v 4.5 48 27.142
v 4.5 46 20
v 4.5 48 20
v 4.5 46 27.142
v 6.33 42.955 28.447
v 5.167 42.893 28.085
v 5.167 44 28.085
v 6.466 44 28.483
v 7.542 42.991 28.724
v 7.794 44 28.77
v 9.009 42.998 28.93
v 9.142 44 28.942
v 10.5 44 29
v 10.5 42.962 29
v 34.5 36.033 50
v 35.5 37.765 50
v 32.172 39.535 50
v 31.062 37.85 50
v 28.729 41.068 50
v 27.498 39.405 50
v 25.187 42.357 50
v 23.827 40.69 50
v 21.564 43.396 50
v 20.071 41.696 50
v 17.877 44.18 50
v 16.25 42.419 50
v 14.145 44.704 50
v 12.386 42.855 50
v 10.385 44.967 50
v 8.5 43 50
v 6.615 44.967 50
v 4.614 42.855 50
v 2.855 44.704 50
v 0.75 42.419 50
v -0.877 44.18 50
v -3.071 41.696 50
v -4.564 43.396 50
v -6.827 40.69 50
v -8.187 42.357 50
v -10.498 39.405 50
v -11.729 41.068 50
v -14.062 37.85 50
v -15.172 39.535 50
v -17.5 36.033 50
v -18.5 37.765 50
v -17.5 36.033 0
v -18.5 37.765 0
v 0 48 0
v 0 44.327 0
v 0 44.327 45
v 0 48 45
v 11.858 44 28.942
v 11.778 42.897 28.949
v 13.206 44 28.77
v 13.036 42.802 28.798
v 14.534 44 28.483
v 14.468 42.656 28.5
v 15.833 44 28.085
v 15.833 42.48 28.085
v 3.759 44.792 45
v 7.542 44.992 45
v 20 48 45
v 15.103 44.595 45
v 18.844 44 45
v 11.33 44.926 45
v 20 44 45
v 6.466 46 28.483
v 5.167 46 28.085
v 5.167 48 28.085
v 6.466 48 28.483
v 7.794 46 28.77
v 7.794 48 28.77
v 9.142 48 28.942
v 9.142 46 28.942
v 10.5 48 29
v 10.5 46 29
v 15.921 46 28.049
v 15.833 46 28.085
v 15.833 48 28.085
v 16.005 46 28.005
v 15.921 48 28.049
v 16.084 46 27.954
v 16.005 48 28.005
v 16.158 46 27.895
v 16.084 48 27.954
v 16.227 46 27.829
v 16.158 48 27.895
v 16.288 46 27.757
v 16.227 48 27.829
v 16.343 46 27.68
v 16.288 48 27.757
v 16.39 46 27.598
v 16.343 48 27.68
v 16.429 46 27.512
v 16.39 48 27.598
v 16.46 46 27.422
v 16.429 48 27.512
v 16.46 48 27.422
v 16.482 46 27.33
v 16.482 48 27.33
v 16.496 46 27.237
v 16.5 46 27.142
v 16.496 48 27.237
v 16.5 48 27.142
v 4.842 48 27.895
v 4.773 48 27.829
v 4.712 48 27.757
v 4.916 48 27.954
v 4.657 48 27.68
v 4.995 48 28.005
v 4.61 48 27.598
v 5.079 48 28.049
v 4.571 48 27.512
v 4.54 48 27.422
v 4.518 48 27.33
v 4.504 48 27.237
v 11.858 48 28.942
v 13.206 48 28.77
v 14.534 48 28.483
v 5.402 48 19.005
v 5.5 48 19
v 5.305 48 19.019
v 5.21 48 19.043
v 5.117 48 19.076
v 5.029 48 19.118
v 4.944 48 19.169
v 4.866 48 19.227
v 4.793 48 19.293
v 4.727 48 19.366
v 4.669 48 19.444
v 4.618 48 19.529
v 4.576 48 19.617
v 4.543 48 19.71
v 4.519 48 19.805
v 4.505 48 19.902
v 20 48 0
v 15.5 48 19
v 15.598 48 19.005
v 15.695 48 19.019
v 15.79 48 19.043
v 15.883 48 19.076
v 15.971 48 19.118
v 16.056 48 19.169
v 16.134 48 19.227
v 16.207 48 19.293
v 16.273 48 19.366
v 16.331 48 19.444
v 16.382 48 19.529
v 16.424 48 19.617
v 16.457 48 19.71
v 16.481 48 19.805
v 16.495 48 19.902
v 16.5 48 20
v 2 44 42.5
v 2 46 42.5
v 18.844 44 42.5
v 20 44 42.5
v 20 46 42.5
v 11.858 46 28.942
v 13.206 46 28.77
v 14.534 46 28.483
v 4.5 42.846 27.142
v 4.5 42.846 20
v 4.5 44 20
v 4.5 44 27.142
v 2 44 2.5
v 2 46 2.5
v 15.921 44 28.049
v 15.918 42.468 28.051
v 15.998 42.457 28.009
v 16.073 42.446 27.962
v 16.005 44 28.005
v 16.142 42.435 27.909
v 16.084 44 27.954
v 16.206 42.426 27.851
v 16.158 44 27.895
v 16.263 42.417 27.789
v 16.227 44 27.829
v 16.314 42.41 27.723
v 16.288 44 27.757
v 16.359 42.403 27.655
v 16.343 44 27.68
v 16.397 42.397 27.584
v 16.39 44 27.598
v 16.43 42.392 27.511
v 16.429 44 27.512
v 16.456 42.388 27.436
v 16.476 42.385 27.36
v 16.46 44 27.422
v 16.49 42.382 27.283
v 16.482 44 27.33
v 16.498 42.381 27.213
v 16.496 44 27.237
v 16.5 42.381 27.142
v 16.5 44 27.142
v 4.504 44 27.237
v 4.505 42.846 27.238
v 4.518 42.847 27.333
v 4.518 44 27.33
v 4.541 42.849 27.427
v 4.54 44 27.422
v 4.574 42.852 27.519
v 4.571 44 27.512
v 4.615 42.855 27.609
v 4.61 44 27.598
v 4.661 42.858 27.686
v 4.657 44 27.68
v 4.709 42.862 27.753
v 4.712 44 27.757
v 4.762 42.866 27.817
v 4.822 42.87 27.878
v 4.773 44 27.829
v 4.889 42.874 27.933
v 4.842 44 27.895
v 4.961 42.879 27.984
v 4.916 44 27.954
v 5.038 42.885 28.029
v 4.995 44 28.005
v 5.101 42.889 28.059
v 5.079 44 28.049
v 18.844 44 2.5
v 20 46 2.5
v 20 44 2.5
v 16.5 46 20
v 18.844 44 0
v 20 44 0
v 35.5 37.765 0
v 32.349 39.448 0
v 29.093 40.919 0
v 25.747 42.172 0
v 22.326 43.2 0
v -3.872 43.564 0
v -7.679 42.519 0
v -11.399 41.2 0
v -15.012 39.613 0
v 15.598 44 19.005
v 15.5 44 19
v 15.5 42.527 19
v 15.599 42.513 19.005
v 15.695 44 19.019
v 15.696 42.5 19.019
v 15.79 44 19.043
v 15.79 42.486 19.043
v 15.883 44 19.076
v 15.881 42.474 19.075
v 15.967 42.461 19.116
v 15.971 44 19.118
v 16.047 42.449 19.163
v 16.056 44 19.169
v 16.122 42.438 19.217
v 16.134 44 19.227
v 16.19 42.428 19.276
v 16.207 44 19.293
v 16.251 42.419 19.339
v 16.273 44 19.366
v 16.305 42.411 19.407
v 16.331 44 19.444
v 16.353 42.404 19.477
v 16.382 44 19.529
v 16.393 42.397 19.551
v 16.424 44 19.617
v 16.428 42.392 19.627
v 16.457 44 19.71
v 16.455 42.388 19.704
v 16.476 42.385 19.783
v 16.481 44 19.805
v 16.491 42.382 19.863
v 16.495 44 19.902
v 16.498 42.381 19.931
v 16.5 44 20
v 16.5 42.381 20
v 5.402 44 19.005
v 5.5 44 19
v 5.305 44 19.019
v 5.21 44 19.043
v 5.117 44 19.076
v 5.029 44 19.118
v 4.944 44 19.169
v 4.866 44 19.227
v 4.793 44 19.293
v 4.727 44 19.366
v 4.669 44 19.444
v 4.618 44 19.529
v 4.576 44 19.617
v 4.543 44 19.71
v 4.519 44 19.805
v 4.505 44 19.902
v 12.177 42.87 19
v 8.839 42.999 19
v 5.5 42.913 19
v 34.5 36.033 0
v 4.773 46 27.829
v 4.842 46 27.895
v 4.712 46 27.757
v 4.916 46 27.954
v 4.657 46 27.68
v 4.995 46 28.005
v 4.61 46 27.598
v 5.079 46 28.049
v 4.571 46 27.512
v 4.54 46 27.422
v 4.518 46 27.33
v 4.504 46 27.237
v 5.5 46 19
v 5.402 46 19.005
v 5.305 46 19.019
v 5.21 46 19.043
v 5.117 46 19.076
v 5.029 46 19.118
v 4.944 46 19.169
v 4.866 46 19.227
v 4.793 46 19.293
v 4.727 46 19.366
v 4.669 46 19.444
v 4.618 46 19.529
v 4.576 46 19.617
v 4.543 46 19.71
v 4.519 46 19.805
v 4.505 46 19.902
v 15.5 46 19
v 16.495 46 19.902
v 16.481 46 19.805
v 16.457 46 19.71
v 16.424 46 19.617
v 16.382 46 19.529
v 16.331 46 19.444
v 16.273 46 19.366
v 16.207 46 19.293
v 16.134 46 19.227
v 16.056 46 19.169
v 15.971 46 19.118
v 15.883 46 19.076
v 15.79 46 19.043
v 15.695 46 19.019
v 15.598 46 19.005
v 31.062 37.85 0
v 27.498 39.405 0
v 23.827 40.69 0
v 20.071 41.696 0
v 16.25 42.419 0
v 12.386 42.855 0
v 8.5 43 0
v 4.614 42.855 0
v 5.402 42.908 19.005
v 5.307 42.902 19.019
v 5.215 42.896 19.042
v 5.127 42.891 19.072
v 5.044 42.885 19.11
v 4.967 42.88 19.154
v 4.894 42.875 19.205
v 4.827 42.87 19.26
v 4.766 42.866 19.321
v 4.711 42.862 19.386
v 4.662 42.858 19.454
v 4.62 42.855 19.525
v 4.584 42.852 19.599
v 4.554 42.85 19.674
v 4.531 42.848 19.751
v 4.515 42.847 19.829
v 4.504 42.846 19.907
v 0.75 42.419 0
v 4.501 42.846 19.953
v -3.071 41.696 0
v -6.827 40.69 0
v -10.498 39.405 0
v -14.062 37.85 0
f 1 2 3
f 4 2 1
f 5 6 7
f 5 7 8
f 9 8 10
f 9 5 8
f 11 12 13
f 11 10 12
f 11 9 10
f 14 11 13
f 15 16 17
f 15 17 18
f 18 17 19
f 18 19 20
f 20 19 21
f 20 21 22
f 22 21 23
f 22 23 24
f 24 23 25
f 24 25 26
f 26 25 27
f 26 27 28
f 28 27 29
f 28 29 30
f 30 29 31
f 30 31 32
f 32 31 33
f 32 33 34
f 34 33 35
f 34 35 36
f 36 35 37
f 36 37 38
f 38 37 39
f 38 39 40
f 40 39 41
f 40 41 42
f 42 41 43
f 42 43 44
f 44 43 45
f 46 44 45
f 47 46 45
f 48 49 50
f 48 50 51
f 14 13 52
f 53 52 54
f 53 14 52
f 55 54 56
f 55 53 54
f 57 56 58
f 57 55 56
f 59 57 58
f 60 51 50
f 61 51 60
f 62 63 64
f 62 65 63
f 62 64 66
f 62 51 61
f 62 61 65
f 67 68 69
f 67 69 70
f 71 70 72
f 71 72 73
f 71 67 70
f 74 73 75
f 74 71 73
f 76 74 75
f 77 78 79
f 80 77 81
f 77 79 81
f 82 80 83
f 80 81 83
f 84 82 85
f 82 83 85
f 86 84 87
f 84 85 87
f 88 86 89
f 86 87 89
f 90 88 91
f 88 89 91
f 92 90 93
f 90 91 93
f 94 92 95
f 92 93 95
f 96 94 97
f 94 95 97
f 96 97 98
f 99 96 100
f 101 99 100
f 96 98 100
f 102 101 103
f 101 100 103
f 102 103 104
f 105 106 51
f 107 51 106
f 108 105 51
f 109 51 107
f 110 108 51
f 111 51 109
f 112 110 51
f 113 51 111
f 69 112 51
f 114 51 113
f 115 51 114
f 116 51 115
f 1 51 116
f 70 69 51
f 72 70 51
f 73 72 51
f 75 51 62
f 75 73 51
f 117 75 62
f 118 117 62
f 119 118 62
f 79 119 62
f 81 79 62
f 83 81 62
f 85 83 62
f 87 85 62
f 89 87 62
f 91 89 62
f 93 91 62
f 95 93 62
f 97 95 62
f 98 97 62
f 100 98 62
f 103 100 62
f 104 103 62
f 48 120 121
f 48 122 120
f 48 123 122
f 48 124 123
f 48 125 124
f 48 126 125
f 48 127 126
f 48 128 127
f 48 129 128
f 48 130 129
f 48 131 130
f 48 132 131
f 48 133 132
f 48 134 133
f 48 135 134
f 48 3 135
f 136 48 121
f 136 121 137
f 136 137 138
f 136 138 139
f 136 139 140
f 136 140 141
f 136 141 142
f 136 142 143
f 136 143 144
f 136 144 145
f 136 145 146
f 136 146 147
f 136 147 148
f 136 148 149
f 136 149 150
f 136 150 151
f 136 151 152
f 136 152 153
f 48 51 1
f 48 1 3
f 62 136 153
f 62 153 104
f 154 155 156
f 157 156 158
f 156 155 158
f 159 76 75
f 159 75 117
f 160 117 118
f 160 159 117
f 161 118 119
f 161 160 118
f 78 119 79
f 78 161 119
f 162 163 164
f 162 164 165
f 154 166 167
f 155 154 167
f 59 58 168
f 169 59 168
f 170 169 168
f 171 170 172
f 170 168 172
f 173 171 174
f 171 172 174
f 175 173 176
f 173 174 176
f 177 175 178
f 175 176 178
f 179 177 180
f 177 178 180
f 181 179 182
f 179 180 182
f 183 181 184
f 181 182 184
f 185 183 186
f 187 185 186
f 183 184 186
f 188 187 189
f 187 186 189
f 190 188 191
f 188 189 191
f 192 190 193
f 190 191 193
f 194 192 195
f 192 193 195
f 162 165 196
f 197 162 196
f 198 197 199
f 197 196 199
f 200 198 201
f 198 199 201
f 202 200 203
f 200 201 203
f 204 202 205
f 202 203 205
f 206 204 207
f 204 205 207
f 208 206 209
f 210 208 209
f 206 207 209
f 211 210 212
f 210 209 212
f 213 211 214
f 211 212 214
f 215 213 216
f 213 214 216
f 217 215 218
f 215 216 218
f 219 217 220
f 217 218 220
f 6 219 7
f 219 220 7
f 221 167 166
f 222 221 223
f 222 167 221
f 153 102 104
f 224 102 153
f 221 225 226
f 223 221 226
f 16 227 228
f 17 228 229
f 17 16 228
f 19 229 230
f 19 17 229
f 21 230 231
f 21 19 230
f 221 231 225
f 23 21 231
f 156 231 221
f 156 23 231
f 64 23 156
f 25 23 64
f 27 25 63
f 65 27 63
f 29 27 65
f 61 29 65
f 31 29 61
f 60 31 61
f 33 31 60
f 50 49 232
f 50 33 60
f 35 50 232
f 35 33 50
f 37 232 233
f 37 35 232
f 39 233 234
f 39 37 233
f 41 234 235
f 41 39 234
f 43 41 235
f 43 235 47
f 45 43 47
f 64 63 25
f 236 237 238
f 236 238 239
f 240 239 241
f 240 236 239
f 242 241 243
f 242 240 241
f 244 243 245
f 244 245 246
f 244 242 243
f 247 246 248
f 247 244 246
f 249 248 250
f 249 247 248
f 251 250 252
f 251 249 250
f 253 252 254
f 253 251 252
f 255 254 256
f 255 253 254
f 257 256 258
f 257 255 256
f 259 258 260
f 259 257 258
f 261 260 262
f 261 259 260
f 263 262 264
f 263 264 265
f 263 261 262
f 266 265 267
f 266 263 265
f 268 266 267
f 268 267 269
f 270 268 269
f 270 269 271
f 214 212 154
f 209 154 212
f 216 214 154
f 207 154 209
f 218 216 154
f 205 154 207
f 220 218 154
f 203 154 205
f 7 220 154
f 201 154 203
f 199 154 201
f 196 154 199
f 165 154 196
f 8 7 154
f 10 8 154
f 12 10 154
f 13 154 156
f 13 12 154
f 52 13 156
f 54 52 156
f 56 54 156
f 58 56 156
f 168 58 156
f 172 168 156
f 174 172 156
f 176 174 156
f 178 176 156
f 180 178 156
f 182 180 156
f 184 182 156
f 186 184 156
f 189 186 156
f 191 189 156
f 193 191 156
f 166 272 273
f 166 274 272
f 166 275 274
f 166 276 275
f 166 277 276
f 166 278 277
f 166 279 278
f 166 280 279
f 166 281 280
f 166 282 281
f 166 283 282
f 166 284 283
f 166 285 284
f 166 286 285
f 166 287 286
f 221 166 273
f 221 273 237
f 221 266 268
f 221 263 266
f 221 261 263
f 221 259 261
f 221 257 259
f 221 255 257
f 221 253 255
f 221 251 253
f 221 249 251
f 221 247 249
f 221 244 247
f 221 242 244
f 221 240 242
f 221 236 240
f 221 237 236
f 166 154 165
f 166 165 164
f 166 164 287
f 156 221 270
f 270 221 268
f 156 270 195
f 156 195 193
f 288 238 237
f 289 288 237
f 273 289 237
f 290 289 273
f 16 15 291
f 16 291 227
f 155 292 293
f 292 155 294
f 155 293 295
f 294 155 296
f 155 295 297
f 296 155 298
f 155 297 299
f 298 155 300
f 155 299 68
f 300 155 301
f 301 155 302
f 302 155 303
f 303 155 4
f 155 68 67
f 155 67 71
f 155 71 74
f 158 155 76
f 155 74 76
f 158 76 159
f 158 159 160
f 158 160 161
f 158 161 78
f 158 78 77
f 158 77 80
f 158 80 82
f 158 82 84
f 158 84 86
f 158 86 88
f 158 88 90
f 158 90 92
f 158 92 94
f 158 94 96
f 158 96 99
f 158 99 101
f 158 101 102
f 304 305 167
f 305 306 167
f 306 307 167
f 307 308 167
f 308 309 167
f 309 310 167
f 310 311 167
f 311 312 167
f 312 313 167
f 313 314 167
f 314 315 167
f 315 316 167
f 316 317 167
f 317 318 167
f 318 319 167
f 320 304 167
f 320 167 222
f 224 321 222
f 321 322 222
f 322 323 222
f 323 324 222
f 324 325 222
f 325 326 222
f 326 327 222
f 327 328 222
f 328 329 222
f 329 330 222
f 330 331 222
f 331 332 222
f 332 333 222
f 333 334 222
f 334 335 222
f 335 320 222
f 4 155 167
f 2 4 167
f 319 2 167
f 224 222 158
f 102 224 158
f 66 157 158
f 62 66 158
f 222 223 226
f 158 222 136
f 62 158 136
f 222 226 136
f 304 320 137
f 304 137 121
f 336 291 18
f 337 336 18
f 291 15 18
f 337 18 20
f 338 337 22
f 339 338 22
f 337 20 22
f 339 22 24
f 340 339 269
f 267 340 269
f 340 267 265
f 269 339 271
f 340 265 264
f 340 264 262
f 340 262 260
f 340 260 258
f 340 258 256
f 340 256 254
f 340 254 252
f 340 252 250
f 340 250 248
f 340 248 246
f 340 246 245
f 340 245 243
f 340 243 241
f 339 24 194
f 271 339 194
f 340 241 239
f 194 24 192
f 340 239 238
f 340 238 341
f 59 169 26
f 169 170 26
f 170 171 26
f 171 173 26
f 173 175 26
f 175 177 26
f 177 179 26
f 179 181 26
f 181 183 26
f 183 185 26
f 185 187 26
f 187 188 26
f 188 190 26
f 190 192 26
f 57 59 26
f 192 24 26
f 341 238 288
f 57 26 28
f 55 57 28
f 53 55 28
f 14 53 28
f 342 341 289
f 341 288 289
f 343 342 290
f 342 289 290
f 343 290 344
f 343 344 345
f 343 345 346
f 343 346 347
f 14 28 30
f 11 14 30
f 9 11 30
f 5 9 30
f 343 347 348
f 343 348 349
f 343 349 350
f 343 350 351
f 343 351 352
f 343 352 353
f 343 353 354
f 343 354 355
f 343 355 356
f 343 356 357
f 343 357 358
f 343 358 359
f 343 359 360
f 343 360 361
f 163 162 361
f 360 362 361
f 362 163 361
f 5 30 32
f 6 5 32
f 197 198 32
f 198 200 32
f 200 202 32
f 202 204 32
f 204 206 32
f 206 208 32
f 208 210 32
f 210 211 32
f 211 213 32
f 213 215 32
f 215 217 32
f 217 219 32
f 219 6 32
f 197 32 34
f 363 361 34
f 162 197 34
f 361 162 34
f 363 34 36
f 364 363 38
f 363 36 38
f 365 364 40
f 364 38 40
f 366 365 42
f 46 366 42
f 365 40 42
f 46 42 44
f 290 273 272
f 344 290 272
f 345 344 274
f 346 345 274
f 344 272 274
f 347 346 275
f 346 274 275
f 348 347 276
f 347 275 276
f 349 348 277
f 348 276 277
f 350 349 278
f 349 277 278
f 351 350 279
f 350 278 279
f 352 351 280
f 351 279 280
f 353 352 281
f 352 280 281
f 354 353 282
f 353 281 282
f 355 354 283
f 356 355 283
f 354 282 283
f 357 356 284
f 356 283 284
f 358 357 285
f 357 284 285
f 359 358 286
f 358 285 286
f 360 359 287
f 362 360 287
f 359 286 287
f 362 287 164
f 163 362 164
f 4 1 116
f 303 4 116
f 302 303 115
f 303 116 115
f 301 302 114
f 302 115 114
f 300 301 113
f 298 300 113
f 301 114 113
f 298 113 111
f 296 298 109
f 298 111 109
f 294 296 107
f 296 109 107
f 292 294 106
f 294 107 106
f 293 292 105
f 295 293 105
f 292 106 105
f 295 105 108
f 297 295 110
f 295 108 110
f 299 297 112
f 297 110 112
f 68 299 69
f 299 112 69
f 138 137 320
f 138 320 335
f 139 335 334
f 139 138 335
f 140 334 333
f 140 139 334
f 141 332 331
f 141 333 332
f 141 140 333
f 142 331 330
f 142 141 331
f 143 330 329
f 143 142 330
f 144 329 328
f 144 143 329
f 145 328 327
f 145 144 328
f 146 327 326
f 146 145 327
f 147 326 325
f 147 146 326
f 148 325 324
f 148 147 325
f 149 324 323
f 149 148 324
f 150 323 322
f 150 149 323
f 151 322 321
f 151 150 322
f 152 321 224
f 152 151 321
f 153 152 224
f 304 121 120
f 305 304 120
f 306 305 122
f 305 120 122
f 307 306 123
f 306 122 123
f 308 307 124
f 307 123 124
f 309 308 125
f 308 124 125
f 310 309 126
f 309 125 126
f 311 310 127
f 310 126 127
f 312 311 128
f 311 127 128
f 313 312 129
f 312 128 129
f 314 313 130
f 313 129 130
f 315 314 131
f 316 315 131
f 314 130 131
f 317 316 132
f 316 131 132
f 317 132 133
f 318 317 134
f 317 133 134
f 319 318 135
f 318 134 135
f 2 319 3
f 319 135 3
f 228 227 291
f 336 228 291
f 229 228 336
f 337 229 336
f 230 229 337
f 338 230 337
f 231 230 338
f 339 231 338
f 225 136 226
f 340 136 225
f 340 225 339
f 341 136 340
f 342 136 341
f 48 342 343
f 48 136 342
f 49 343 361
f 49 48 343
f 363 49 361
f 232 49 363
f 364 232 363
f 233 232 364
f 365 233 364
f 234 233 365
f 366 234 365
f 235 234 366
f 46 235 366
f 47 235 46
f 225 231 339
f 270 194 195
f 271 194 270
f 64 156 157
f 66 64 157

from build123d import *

# Parameters (mm, degrees)
BOX002_W                    = 20
BOX002_H                    = 2
BOX002_DEPTH                = 40
EXTRUDE_DEPTH               = 6
EXTRUDE001_DEPTH            = 6
THICKNESS_T                 = 1
BOX001_W                    = 20
BOX001_H                    = 4
BOX001_DEPTH                = 45
CYLINDER001_W               = 52
CYLINDER001_H               = 50
CYLINDER001_ANGLE           = 60
CYLINDER001_PLACEMENT_ANGLE = 60
CYLINDER_W                  = 54
CYLINDER_H                  = 50
CYLINDER_ANGLE              = 60
CYLINDER_PLACEMENT_ANGLE    = 60


with BuildPart() as slot:
    # Box002 → Box002 (new body)
    with BuildSketch(Plane(origin=(2, 44, 2.5), x_dir=(1, 0, 0), z_dir=(0, 0, 1))):
        with Locations((10, 1)):
            Rectangle(BOX002_W, BOX002_H)
    extrude(amount=BOX002_DEPTH)


with BuildPart() as extrude_body:
    # Common_cs001 → Extrude (new body)
    with BuildSketch(Plane(origin=(8.5, 45, 6), x_dir=(1, 0, 0), z_dir=(0, 1, 0))):
        with BuildLine():
            Line((5, 4), (-5, 4))
            Line((-5, 4), (-5, -3.142136))
            ThreePointArc((-5, -3.142136), (-2.53653, -3.783978), (0, -4))
            ThreePointArc((0, -4), (2.53653, -3.783978), (5, -3.142136))
            Line((5, -3.142136), (5, 4))
        make_face()
    extrude(amount=EXTRUDE_DEPTH)


with BuildPart() as extrude001:
    # Common_cs002 → Extrude001 (new body)
    with BuildSketch(Plane(origin=(8.5, 45, 6), x_dir=(1, 0, 0), z_dir=(0, 1, 0))):
        with BuildLine():
            Line((5, 4), (-5, 4))
            Line((-5, 4), (-5, -3.142136))
            ThreePointArc((-5, -3.142136), (-2.53653, -3.783978), (0, -4))
            ThreePointArc((0, -4), (2.53653, -3.783978), (5, -3.142136))
            Line((5, -3.142136), (5, 4))
        make_face()
    extrude(amount=EXTRUDE001_DEPTH)


with BuildPart() as pin_opening:
    # Thickness base: copy of Extrude body
    add(extrude_body.part)

    # Thickness
    thickness_openings = [pin_opening.faces().sort_by_distance(p)[0] for p in [
        (8.5, 51, 5.862901),
    ]]
    offset(amount=THICKNESS_T, openings=thickness_openings)

    # Fusion002: union Extrude body, Extrude001
    add(extrude_body.part)
    add(extrude001.part)


with BuildPart() as pin_opening_1:
    # Fusion002 placement: moved
    add(pin_opening.part.moved(Location((2, -3, 18))))


with BuildPart() as latch:
    # Box001 → Box001 (new body)
    with BuildSketch(Plane(origin=(0, 44, 0), x_dir=(1, 0, 0), z_dir=(0, 0, 1))):
        with Locations((10, 2)):
            Rectangle(BOX001_W, BOX001_H)
    extrude(amount=BOX001_DEPTH)


with BuildPart() as bottle_wall001:
    # Cylinder001 → Cylinder001 (revolve)
    with BuildSketch(Plane.XZ):
        with Locations((26, 25)):
            Rectangle(CYLINDER001_W, CYLINDER001_H)
    revolve(axis=Axis((0, 0, 0), (0, 0, 1)), revolution_arc=CYLINDER001_ANGLE)


with BuildPart() as bottle_wall001_1:
    # Cylinder001 placement: moved
    add(bottle_wall001.part.moved(Location((8.5, -7, 0))).rotate(Axis((8.5, -7, 0), (0, 0, 1)), CYLINDER001_PLACEMENT_ANGLE))


with BuildPart() as cut004:
    # Cylinder → Cylinder (revolve)
    with BuildSketch(Plane.XZ):
        with Locations((27, 25)):
            Rectangle(CYLINDER_W, CYLINDER_H)
    revolve(axis=Axis((0, 0, 0), (0, 0, 1)), revolution_arc=CYLINDER_ANGLE)


with BuildPart() as cut004_1:
    # Cylinder placement: moved
    add(cut004.part.moved(Location((8.5, -7, 0))).rotate(Axis((8.5, -7, 0), (0, 0, 1)), CYLINDER_PLACEMENT_ANGLE))

    # Cut: cut bottle_wall001
    add(bottle_wall001_1.part, mode=Mode.SUBTRACT)


with BuildPart() as cut004_2:
    # Cut placement: moved
    add(cut004_1.part.moved(Location((0, -2, 0))))

    # Fusion: union latch
    add(latch.part)

    # Fusion001: union latch
    add(latch.part)

    # Cut003: cut pin opening
    add(pin_opening_1.part, mode=Mode.SUBTRACT)

    # Cut004: cut slot
    add(slot.part, mode=Mode.SUBTRACT)


solid = cut004_2.part
